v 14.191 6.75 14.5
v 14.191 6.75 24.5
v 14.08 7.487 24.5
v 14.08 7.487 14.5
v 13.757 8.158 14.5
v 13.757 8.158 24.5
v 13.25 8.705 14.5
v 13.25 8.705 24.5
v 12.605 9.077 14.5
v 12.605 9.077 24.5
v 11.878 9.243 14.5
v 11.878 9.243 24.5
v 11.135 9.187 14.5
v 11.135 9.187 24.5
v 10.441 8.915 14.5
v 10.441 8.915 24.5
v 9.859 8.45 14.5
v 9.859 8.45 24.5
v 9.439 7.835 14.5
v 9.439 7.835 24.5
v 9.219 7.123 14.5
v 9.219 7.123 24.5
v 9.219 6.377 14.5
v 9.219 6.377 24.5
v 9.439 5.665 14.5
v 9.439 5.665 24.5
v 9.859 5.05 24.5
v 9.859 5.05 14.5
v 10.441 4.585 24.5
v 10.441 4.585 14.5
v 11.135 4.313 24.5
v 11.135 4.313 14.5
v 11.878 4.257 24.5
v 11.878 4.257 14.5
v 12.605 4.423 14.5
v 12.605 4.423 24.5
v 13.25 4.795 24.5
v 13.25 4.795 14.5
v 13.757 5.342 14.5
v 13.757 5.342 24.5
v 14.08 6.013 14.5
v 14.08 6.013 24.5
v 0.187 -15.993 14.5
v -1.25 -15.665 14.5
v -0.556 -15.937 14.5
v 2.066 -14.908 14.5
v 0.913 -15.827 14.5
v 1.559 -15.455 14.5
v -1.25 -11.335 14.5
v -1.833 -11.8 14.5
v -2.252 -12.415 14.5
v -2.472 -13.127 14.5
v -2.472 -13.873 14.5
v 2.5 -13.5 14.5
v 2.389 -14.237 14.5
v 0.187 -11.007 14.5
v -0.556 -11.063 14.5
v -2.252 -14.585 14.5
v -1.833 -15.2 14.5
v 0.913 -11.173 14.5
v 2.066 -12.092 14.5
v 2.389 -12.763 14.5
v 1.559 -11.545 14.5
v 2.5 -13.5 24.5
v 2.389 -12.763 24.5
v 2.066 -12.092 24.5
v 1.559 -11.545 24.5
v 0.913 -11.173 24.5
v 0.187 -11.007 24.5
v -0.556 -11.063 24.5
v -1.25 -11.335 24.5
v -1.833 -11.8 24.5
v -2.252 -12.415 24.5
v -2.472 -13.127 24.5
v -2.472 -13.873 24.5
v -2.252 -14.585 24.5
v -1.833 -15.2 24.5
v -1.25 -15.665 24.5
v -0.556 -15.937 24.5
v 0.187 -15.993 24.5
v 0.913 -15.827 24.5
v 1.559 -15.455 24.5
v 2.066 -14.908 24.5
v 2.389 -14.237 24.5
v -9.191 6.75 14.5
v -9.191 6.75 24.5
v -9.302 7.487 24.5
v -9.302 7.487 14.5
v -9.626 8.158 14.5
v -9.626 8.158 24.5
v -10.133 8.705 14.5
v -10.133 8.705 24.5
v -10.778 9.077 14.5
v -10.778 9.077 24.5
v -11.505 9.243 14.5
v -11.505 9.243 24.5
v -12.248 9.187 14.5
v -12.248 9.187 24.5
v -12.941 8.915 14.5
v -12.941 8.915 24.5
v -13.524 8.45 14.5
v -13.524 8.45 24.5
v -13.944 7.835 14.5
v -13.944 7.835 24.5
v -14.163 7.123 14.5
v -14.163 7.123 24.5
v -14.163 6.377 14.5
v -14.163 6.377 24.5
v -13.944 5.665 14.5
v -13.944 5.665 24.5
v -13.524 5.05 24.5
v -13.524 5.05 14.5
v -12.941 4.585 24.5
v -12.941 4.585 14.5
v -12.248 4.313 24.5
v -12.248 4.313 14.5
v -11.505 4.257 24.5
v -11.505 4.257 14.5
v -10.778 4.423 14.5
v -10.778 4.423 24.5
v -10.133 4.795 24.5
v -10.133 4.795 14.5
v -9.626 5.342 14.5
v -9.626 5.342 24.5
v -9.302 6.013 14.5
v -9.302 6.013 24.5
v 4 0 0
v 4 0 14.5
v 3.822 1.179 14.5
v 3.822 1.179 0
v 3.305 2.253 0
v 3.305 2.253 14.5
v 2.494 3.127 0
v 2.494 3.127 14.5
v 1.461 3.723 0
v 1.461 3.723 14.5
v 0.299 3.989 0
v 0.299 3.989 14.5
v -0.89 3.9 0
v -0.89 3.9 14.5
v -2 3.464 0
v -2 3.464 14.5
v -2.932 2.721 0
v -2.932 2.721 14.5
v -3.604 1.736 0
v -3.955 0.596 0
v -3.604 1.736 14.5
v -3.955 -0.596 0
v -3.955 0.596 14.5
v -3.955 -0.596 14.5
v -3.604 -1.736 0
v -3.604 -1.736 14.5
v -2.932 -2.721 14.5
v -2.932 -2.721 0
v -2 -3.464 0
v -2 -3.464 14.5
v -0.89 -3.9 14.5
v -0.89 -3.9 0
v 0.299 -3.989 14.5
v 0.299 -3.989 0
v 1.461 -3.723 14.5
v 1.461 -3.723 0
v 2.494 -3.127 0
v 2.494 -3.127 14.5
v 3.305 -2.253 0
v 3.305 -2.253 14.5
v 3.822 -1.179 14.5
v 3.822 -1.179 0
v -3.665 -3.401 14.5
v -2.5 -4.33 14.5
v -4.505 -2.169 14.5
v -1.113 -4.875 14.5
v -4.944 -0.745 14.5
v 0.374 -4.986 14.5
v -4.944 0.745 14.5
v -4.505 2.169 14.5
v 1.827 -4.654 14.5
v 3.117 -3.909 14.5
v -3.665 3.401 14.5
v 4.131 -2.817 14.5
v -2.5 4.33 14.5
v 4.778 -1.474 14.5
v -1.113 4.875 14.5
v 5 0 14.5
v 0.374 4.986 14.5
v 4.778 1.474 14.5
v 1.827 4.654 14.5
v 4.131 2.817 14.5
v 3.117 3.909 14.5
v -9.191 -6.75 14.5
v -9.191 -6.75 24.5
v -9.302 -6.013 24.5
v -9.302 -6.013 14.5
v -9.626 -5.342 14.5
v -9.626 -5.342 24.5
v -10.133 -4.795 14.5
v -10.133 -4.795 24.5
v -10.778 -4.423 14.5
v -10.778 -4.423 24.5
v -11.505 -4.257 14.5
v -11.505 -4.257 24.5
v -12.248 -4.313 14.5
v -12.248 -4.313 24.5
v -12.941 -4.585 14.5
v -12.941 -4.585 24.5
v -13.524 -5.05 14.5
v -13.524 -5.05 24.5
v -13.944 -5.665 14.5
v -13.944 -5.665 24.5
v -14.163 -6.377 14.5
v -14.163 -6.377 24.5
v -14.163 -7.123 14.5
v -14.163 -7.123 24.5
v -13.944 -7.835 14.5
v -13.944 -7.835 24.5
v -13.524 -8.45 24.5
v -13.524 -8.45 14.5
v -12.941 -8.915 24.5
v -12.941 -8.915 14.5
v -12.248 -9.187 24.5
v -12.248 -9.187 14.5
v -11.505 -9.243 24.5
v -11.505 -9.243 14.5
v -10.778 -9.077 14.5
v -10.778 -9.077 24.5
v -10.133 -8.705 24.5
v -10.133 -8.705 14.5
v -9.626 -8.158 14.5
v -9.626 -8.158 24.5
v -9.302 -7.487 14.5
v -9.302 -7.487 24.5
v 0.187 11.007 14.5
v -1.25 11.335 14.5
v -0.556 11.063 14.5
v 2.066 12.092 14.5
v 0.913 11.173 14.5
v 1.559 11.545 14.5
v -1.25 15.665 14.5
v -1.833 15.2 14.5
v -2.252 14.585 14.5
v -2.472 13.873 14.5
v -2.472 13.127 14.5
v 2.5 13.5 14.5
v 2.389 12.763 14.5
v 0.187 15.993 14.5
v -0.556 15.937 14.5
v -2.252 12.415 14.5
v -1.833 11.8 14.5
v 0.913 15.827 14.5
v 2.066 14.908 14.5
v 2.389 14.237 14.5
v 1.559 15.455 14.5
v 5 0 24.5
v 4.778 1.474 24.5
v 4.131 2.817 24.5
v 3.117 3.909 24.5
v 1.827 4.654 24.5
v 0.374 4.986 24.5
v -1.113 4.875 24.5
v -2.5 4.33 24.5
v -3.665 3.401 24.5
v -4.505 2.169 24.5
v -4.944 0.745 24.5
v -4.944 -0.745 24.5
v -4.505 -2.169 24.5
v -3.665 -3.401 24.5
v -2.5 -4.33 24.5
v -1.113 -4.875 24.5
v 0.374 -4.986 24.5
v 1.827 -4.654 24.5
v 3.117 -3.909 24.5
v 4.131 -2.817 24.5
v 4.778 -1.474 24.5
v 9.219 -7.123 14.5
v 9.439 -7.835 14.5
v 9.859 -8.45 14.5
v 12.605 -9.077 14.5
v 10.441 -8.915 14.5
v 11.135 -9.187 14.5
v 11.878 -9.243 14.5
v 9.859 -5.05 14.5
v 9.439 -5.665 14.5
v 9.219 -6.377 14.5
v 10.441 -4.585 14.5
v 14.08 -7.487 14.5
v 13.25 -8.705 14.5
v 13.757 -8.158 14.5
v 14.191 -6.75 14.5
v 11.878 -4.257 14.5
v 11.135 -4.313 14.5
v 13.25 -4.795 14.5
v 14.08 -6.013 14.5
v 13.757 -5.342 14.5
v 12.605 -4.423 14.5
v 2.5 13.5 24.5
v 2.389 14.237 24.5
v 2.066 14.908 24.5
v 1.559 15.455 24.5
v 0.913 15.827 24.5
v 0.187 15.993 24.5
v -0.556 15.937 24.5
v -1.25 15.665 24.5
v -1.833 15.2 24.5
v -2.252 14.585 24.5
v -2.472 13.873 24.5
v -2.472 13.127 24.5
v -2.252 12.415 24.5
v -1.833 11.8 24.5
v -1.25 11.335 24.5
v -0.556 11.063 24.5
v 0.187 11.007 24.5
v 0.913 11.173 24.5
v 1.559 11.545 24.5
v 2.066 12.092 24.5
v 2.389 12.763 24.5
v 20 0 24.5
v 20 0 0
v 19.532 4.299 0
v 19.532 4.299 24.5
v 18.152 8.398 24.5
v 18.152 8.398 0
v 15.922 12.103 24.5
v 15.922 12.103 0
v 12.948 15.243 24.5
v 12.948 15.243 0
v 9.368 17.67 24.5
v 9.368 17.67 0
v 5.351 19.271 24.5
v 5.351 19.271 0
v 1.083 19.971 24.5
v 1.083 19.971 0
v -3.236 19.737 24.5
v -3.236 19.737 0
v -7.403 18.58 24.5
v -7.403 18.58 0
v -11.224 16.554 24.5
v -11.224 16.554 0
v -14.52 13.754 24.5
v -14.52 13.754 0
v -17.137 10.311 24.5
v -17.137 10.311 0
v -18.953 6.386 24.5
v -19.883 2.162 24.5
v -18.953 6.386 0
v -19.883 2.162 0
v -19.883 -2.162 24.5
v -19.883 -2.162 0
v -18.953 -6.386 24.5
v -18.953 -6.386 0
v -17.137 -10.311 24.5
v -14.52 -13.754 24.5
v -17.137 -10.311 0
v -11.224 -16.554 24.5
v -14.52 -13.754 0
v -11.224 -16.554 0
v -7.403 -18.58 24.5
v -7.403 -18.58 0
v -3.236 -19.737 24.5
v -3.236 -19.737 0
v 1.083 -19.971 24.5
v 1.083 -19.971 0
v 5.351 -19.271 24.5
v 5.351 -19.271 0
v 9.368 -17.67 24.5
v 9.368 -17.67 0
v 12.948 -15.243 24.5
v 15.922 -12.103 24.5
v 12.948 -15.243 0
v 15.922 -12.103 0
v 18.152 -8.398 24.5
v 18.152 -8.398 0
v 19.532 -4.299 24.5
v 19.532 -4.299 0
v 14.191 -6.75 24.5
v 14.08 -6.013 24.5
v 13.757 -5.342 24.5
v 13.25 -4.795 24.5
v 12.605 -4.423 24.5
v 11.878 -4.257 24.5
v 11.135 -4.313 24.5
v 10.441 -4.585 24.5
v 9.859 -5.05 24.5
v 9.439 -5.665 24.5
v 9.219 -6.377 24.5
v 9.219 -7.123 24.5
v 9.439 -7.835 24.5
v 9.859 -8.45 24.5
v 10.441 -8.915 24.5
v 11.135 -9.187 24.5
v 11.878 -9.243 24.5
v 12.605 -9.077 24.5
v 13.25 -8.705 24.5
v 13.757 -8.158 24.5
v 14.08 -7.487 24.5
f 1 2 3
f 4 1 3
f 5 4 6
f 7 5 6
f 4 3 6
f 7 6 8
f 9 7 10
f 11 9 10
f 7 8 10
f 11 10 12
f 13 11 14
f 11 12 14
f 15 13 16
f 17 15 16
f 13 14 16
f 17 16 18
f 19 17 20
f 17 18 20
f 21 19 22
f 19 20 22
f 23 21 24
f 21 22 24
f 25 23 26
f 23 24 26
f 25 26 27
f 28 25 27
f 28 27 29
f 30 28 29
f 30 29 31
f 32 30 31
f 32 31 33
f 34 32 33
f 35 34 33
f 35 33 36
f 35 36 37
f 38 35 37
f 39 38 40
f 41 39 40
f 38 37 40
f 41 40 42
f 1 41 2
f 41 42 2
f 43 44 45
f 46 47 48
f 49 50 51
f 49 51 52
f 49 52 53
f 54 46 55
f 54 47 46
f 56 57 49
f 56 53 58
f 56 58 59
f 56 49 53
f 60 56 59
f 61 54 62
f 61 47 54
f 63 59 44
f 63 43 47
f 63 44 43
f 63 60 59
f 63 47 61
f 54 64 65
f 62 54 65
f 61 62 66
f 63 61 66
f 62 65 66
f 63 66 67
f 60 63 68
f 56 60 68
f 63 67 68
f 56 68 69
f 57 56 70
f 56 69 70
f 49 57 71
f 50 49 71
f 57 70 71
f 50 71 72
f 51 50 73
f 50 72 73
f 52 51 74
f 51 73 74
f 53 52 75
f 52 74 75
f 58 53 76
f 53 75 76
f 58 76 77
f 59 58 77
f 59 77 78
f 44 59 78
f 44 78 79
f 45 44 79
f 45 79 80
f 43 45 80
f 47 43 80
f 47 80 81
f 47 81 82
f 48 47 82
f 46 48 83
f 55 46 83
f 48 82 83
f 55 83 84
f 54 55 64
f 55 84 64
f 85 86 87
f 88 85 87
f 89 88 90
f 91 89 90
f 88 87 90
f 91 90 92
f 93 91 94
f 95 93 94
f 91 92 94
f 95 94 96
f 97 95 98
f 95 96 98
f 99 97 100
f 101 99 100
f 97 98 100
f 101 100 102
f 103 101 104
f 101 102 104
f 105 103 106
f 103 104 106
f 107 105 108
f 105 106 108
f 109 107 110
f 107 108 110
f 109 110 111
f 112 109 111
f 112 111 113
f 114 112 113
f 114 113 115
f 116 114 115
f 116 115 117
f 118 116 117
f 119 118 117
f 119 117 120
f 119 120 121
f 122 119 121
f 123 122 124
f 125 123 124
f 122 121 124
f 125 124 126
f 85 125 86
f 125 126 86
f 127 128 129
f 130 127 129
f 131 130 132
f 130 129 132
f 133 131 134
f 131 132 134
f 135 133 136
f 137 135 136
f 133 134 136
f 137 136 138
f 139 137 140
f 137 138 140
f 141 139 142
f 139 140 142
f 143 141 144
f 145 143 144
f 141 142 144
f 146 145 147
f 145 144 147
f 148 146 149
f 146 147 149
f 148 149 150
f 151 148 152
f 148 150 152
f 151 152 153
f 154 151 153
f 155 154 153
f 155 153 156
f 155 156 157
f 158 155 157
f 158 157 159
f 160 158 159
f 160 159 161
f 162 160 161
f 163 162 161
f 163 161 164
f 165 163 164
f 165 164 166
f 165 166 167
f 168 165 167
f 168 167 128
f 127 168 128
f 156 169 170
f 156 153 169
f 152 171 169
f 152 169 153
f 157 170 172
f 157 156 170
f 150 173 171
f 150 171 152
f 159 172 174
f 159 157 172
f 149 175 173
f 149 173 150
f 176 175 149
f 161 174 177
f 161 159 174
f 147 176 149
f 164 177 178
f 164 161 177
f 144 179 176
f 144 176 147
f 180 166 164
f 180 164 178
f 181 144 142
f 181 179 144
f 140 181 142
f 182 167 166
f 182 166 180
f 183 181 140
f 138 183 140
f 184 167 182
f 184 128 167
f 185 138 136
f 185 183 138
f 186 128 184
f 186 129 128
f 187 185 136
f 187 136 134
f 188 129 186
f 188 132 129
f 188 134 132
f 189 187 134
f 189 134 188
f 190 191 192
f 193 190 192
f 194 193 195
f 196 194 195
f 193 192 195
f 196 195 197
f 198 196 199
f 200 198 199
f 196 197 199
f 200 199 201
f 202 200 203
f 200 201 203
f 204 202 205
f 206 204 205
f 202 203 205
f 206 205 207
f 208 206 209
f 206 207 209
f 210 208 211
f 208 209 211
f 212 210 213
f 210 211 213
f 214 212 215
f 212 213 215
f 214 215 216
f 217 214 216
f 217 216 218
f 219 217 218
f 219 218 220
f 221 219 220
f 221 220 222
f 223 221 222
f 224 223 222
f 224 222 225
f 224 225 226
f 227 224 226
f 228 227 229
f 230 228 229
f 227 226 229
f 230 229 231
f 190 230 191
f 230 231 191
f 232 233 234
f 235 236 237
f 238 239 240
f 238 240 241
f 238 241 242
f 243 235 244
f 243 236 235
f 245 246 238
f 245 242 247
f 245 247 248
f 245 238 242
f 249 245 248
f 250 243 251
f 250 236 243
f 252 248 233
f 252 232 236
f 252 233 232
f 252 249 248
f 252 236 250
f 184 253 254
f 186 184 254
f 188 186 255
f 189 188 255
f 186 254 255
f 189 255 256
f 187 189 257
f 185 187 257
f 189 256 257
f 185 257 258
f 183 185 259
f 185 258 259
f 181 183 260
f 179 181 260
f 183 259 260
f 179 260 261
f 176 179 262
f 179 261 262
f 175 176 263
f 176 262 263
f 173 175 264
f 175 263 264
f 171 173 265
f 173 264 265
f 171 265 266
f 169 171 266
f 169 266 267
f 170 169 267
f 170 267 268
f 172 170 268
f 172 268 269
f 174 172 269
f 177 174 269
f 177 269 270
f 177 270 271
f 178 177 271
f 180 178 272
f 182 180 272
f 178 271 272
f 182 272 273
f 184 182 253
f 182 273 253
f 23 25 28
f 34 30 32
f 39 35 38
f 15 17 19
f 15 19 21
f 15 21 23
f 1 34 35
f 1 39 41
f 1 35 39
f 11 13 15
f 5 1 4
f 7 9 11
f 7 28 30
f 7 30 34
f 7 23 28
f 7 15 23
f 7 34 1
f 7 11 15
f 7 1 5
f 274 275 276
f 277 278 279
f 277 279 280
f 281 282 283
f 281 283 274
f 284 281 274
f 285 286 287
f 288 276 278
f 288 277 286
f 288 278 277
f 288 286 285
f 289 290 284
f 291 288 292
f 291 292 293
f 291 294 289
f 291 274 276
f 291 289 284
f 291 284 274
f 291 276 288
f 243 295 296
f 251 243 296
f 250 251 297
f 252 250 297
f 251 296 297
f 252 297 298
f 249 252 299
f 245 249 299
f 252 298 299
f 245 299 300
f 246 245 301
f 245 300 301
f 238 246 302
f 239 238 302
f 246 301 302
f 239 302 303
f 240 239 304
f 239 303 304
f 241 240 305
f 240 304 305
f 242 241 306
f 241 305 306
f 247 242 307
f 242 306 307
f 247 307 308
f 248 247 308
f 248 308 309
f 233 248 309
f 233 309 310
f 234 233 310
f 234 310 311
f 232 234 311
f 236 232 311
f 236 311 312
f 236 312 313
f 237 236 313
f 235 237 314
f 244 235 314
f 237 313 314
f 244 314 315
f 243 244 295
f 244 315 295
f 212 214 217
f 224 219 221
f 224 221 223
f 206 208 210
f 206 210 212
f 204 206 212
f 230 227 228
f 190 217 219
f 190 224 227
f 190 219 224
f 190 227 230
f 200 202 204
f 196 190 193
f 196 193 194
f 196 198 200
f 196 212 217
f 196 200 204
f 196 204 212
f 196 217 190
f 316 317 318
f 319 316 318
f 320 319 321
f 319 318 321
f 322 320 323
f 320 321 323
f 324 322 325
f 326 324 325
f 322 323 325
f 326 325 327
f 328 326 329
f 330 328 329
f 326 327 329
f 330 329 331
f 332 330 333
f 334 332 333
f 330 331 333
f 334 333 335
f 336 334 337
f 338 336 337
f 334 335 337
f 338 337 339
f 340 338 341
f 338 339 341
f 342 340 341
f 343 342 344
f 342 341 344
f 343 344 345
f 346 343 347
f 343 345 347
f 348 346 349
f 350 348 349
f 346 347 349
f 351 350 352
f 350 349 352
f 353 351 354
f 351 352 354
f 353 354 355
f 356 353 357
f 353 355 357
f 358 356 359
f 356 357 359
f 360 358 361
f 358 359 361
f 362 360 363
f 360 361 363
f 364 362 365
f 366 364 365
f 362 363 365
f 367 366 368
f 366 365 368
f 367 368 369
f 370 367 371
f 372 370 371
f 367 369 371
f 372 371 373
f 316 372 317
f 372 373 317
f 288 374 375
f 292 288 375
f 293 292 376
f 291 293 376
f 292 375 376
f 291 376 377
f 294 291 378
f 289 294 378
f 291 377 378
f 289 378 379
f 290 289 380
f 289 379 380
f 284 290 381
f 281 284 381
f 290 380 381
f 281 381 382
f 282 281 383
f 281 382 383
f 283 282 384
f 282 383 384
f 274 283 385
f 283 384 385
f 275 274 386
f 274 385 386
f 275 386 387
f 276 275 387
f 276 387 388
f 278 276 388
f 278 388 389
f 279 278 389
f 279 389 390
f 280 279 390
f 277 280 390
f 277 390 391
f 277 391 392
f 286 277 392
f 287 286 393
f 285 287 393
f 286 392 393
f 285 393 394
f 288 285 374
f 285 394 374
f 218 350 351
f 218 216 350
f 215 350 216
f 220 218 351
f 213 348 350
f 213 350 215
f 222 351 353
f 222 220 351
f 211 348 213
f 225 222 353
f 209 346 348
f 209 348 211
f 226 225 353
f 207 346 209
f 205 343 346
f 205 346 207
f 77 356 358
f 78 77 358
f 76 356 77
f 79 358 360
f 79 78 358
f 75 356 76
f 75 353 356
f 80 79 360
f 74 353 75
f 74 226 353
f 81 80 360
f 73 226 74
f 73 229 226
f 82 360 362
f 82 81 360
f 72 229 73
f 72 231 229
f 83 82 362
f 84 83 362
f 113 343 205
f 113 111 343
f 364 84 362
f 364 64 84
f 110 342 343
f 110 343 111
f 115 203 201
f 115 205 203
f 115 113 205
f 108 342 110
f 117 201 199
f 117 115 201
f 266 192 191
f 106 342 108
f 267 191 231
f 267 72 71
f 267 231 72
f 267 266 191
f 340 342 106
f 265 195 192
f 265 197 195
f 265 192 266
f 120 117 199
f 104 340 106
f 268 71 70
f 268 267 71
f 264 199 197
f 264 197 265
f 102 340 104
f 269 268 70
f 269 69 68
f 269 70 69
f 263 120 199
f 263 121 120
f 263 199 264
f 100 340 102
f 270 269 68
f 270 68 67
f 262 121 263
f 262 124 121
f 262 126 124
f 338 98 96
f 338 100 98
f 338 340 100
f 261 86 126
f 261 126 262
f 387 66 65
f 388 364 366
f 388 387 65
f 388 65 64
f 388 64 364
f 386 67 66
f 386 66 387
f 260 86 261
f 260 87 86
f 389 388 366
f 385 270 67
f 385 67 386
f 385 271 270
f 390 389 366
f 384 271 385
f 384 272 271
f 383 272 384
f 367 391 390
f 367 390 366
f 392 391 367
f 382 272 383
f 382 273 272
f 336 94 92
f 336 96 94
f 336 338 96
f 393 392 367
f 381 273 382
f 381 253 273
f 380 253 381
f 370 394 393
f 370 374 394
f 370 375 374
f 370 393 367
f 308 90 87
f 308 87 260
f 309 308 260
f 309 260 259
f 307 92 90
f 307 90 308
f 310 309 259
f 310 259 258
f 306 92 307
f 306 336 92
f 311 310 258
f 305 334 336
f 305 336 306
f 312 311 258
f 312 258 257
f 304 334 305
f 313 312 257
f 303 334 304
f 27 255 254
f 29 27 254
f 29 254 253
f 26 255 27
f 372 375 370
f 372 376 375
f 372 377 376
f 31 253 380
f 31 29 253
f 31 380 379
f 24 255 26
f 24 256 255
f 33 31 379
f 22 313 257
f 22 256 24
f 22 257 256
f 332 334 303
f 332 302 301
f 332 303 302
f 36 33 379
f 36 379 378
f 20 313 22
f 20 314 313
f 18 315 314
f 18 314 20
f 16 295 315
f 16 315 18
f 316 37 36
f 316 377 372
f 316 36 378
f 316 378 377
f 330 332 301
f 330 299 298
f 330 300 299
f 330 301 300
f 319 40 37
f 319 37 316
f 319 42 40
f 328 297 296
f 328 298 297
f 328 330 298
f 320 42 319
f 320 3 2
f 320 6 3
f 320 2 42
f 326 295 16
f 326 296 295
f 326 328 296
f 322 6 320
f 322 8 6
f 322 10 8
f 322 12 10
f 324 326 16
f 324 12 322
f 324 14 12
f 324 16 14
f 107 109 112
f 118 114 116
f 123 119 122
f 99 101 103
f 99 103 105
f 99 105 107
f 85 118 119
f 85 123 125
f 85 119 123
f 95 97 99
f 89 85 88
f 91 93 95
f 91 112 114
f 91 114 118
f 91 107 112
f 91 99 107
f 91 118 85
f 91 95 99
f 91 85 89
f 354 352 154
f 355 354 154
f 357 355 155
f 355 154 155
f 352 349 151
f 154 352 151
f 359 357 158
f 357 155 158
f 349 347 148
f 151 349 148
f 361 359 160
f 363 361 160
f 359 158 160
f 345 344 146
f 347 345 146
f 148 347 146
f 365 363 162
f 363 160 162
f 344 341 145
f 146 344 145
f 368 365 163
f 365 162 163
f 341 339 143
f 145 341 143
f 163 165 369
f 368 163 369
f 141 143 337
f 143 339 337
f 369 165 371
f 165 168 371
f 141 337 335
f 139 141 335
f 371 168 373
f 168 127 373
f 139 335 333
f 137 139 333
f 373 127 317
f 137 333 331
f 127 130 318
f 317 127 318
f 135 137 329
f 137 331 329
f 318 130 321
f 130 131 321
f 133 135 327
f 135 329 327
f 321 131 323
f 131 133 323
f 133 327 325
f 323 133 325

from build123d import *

# Parameters (mm, degrees)
SKETCH_1_R          = 20
EXTRUDE_1_DEPTH     = 24.5
SKETCH_2_R          = 5
CUT_EXTRUDE_1_DEPTH = 10
SKETCH_3_R          = 4
CUT_EXTRUDE_2_DEPTH = 32.784430151
SKETCH_4_R          = 2.5
CUT_EXTRUDE_3_DEPTH = 10


with BuildPart() as part:
    # 스케치1 → 보스-돌출1 (new body)
    with BuildSketch(Plane.XY):
        Circle(SKETCH_1_R)
    extrude(amount=EXTRUDE_1_DEPTH)

    # 스케치2 → 컷-돌출1 (cut)
    with BuildSketch(Plane.XY.offset(24.5)):
        Circle(SKETCH_2_R)
    extrude(amount=-CUT_EXTRUDE_1_DEPTH, mode=Mode.SUBTRACT)

    # 스케치3 → 컷-돌출2 (cut, through all)
    with BuildSketch(Plane.XY.offset(14.5)):
        Circle(SKETCH_3_R)
    extrude(amount=-CUT_EXTRUDE_2_DEPTH, mode=Mode.SUBTRACT)

    # 스케치4 → 컷-돌출3 (cut)
    with BuildSketch(Plane.XY.offset(24.5)):
        with Locations((11.691342951, 6.75)):
            Circle(SKETCH_4_R)
        with Locations((0, 13.5)):
            Circle(SKETCH_4_R)
        with Locations((11.691342951, -6.75)):
            Circle(SKETCH_4_R)
        with Locations((0, -13.5)):
            Circle(SKETCH_4_R)
        with Locations((-11.691342951, -6.75)):
            Circle(SKETCH_4_R)
        with Locations((-11.691342951, 6.75)):
            Circle(SKETCH_4_R)
    extrude(amount=-CUT_EXTRUDE_3_DEPTH, mode=Mode.SUBTRACT)


solid = part.part
